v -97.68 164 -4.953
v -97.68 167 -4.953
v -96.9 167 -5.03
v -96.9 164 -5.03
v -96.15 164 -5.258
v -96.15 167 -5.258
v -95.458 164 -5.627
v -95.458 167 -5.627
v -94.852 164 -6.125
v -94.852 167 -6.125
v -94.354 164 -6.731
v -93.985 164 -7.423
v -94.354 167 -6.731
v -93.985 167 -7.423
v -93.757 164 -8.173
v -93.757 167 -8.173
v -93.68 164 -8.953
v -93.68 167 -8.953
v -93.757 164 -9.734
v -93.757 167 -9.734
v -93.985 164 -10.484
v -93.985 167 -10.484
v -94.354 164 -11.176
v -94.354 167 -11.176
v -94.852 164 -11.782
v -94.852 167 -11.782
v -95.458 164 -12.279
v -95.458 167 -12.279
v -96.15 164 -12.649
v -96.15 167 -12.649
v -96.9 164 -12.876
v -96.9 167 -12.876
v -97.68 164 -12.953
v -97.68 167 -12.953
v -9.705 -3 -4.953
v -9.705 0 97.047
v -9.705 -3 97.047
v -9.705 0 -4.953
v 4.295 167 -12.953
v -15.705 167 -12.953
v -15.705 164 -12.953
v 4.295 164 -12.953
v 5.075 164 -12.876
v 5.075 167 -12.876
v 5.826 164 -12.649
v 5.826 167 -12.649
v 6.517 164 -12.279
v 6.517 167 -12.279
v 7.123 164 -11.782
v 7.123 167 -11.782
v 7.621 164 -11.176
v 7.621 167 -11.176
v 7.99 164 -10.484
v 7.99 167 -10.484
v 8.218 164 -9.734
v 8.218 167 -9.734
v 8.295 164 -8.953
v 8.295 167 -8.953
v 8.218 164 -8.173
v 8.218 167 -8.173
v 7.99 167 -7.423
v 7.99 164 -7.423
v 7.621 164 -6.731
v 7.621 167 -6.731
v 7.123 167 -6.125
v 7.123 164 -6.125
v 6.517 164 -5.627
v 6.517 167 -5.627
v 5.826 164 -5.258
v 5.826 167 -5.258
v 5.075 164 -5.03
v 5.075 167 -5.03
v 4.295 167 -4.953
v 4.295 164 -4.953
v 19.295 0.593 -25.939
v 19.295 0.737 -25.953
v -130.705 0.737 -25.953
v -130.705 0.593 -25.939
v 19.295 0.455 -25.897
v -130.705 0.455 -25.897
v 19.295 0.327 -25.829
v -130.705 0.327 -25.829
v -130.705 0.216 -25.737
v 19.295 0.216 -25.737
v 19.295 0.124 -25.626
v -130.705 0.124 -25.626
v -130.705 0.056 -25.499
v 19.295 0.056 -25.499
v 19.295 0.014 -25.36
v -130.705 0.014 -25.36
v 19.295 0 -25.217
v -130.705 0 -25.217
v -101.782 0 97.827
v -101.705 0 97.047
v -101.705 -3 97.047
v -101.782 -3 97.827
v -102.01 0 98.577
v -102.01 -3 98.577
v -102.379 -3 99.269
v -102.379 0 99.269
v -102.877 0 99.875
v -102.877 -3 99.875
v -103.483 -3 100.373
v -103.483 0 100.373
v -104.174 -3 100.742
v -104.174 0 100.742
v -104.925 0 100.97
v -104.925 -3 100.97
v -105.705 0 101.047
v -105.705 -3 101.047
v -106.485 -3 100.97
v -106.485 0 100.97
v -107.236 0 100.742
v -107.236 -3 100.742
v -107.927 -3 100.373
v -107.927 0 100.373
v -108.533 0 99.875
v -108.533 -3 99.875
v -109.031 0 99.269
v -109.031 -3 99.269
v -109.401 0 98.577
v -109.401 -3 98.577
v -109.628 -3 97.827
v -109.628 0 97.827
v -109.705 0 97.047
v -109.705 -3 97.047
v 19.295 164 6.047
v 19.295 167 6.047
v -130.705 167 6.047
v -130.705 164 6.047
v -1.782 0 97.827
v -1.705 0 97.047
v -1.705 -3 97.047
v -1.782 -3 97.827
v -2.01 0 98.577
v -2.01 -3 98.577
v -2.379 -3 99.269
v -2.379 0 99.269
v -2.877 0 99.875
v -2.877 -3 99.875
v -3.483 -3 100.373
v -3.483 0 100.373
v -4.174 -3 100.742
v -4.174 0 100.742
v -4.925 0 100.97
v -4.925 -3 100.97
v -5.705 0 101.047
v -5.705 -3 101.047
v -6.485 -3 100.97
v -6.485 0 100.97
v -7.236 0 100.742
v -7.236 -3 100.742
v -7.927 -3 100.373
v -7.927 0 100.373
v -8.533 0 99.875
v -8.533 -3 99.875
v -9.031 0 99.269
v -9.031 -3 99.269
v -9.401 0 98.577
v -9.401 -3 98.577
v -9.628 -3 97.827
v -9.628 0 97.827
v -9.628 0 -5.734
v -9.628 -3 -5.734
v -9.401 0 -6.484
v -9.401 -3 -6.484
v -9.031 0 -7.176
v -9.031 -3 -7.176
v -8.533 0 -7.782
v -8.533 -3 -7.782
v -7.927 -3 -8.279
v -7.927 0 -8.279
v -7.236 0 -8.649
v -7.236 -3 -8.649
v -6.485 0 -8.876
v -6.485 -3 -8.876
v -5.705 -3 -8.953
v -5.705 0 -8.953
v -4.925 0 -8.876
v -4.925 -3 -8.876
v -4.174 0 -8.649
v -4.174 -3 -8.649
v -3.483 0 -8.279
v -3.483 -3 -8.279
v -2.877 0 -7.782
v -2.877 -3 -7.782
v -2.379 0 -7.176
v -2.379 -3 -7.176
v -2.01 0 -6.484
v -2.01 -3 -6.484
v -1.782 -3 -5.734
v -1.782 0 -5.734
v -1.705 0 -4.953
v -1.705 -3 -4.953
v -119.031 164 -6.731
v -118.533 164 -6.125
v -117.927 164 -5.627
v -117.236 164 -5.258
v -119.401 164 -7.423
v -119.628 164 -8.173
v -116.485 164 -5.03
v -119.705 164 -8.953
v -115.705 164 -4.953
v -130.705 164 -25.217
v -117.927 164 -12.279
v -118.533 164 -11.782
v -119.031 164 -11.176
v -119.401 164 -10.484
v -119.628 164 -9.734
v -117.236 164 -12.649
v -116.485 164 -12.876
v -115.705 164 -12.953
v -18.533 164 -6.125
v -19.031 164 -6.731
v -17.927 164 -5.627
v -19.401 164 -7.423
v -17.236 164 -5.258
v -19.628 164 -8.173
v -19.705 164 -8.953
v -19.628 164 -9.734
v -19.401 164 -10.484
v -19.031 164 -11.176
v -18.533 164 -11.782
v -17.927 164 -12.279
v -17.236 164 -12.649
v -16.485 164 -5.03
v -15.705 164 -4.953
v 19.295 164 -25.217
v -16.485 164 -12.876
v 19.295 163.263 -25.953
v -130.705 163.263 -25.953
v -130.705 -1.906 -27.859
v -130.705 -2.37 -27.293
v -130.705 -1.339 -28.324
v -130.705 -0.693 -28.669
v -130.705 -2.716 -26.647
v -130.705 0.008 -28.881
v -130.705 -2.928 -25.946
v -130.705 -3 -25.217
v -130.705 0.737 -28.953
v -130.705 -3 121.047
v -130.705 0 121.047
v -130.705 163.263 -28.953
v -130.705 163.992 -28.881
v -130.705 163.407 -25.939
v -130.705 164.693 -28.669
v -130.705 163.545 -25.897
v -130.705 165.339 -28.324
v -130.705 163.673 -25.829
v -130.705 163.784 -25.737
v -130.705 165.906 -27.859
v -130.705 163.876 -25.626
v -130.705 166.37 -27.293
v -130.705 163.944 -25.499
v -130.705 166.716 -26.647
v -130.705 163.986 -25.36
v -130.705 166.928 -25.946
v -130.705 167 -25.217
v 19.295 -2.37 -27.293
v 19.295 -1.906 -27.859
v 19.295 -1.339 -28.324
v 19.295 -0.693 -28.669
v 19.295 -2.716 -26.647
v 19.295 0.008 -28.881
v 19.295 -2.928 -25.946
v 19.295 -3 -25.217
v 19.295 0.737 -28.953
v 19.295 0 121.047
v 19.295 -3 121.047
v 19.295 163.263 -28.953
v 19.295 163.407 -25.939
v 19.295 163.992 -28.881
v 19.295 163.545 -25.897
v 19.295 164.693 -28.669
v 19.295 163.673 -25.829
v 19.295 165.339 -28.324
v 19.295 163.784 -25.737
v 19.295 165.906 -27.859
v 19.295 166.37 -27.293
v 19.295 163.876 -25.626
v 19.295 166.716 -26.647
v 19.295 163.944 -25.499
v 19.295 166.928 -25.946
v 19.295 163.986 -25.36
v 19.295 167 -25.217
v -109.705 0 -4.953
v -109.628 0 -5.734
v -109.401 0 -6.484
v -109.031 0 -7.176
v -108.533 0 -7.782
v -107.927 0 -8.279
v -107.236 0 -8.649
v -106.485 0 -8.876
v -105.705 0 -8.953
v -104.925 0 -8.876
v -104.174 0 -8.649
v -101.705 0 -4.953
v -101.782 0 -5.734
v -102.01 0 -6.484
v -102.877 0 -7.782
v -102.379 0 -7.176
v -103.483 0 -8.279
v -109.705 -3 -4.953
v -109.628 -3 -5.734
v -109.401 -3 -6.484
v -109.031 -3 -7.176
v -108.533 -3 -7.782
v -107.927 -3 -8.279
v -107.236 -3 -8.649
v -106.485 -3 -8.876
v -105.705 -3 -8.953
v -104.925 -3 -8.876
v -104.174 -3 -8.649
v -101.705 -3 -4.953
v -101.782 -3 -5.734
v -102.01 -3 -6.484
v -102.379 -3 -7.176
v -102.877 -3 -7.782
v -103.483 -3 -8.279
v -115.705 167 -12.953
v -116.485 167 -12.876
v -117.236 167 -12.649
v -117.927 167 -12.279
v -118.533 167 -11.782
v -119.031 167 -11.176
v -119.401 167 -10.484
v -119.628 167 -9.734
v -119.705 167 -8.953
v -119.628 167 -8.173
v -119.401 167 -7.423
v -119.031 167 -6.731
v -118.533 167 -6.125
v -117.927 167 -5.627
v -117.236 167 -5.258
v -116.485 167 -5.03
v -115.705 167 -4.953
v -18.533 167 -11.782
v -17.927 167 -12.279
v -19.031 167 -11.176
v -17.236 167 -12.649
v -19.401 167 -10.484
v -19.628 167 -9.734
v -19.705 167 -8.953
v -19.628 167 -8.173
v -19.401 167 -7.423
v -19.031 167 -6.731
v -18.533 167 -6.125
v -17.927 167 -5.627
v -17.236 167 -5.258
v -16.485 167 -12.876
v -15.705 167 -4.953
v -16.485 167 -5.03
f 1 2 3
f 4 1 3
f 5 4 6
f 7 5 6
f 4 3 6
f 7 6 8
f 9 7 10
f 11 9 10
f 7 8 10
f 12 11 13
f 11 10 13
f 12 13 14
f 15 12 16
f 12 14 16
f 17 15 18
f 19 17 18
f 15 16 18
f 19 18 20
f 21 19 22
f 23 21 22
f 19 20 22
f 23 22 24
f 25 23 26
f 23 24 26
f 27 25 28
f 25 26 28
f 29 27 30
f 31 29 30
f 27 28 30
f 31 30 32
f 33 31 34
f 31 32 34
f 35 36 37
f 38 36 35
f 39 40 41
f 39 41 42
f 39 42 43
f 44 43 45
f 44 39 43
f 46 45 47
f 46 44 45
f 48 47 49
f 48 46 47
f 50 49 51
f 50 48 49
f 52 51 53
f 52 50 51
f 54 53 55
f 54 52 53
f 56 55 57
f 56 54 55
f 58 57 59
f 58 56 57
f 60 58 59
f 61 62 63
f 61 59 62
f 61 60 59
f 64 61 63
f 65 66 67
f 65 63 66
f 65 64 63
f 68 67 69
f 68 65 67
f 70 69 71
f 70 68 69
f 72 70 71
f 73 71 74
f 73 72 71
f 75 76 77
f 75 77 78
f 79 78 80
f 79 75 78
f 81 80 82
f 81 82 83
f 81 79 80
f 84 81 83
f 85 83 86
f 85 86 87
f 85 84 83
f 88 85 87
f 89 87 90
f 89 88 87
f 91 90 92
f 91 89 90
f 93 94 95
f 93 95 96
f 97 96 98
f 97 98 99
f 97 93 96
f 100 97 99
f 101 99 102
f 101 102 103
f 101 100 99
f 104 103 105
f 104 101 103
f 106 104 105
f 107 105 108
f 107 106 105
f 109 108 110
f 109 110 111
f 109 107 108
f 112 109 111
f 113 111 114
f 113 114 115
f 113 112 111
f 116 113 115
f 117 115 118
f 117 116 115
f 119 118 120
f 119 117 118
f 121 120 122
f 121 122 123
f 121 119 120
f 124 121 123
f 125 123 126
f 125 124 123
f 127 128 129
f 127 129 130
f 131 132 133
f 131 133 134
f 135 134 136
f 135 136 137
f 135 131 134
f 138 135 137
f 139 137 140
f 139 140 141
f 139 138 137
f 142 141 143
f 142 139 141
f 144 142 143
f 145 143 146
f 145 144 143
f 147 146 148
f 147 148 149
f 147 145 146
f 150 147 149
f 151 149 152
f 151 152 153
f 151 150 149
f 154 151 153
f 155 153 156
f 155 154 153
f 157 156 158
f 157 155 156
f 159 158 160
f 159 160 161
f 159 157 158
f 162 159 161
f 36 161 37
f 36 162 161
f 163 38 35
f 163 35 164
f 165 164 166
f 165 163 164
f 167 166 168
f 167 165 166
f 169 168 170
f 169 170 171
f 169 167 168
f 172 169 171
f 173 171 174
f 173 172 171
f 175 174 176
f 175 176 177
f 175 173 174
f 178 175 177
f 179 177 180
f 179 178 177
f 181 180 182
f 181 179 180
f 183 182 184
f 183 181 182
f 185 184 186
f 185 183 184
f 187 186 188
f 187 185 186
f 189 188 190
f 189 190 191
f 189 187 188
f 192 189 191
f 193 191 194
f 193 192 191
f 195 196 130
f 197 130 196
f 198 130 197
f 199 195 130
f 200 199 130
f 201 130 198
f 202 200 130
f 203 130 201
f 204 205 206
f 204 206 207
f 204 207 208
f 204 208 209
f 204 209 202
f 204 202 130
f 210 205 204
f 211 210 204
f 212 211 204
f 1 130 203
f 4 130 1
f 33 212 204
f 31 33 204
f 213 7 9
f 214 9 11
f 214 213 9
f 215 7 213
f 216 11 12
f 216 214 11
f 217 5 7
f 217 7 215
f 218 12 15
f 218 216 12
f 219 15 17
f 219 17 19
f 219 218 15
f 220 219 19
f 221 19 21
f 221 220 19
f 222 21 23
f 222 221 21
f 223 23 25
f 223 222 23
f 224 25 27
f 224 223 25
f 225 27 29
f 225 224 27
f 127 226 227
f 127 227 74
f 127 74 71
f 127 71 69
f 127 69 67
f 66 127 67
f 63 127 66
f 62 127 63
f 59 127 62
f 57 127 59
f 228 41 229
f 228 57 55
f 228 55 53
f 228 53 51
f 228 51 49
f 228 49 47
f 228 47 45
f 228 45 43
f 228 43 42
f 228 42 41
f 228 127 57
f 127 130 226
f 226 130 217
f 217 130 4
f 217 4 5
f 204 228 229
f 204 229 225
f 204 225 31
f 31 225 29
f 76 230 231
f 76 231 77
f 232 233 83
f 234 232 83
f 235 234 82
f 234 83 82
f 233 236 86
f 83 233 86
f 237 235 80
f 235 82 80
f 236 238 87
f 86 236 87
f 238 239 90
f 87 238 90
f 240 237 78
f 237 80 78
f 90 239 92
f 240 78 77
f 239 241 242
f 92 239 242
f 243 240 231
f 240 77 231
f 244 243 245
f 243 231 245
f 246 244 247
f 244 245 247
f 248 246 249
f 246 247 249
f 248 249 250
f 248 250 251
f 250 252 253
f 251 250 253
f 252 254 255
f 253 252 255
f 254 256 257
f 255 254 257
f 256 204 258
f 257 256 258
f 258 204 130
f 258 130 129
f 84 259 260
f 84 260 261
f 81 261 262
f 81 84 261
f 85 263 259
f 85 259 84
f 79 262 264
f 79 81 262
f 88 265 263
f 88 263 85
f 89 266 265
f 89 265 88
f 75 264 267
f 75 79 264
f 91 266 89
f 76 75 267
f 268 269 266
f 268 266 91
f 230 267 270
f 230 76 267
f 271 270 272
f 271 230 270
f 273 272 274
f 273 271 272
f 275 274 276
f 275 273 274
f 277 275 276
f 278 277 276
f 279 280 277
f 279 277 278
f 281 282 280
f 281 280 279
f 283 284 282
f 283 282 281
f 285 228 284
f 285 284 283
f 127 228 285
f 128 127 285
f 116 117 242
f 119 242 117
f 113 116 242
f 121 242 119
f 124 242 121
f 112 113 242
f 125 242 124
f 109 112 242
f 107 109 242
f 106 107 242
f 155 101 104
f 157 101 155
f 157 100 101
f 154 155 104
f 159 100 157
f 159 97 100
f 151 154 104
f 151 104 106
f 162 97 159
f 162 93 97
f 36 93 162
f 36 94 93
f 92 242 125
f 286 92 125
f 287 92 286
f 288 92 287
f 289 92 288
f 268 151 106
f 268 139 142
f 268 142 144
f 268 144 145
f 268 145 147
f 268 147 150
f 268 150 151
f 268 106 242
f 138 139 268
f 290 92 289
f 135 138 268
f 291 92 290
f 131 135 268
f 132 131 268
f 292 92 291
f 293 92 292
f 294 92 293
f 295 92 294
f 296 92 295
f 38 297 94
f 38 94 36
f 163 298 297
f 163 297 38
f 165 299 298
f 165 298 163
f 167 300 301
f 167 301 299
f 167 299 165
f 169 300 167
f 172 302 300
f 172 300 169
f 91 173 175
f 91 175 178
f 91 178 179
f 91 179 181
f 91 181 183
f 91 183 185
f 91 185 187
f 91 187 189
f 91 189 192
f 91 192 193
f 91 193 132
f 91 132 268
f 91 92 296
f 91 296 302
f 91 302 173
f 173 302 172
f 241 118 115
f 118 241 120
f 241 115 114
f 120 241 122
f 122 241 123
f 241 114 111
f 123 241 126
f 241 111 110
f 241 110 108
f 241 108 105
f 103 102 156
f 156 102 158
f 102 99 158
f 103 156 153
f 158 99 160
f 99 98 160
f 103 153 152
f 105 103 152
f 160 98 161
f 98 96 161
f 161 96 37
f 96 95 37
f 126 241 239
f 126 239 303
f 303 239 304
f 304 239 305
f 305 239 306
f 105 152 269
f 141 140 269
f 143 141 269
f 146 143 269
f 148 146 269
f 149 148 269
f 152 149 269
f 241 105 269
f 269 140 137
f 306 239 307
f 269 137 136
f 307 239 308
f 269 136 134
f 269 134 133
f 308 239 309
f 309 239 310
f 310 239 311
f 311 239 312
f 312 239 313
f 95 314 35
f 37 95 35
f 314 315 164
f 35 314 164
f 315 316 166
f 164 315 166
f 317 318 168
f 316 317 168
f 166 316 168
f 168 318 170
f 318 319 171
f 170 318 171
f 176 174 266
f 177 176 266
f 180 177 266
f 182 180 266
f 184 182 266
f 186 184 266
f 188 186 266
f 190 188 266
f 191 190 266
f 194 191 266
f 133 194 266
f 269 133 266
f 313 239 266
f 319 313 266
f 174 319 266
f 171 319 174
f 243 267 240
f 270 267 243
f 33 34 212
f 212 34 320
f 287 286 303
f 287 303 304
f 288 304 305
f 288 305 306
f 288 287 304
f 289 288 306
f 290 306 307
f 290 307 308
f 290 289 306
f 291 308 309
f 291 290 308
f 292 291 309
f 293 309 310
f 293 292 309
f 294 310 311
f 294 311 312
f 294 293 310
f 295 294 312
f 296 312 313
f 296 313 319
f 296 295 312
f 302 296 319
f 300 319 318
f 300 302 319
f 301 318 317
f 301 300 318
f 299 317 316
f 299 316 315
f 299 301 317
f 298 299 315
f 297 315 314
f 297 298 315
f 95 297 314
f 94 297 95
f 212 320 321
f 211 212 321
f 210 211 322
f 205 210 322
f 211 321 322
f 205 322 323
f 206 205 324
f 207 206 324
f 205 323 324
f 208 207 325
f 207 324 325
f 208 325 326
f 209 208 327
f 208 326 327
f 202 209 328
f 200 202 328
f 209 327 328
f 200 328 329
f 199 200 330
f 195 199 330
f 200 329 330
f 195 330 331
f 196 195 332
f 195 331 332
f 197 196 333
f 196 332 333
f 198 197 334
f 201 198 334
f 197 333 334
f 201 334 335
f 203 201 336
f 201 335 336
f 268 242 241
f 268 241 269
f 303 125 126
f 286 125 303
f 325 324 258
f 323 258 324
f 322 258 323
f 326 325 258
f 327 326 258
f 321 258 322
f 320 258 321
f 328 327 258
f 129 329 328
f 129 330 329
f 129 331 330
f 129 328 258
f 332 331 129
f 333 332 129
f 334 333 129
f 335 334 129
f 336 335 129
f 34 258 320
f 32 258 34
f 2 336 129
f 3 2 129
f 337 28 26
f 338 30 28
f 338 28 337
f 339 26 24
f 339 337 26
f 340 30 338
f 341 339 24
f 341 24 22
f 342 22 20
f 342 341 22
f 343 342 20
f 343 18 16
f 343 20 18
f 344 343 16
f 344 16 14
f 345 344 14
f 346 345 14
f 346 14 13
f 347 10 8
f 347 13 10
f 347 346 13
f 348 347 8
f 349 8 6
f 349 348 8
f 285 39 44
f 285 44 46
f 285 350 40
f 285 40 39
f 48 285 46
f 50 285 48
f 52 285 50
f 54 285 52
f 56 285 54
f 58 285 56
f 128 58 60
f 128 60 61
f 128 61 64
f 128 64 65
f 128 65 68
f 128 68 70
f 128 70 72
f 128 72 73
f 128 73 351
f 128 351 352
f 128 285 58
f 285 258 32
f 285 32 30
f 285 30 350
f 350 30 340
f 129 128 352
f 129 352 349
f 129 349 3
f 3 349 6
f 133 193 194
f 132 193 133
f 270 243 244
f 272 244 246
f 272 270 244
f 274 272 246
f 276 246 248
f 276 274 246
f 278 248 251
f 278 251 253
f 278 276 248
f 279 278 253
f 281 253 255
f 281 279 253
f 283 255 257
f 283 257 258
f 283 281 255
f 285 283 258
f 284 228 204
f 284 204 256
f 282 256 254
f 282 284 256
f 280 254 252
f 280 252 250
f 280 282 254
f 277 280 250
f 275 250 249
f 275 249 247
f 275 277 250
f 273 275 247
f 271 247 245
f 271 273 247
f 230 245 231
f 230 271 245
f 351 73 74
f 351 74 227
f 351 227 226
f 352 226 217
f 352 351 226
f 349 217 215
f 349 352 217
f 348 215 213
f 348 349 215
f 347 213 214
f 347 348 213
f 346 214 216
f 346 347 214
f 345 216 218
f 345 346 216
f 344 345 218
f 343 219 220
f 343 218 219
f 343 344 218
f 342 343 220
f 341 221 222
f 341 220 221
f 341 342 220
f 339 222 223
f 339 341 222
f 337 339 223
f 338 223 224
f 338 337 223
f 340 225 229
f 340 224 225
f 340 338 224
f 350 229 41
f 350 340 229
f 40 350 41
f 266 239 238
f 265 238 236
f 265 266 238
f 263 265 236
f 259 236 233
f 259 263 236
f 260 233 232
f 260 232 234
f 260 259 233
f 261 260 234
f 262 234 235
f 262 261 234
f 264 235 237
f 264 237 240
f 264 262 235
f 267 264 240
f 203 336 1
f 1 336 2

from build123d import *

# Parameters (mm, degrees)
SKETCH1_W                    = 150
SKETCH1_H                    = 150
BASE_FLANGE1_DEPTH           = 3
EDGE_FLANGE1_STRIP_W         = 13.4732
EDGE_FLANGE1_STRIP_H         = 3
EDGE_FLANGE1_STRIP_CUT_DEPTH = 150
EDGE_FLANGE1_DEPTH           = 150
EDGE_FLANGE2_STRIP_W         = 13.4732
EDGE_FLANGE2_STRIP_H         = 3
EDGE_FLANGE2_STRIP_CUT_DEPTH = 150
EDGE_FLANGE2_DEPTH           = 150
CUT_EXTRUDE1_DEPTH           = 10


# Sheet-metal steps are written as plain solids
with BuildPart() as part:
    # Sketch1 → Base-Flange1 (new body)
    with BuildSketch(Plane(origin=(0, 0, 0), x_dir=(1, 0, 0), z_dir=(0, 1, 0))):
        with Locations((-55.705035971, -46.04676259)):
            Rectangle(SKETCH1_W, SKETCH1_H)
        with BuildLine():
            Line((-101.705035971, 4.95323741), (-101.705035971, -97.04676259))
            ThreePointArc((-101.705035971, -97.04676259), (-105.705035971, -101.04676259), (-109.705035971, -97.04676259))
            Line((-109.705035971, -97.04676259), (-109.705035971, 4.95323741))
            ThreePointArc((-109.705035971, 4.95323741), (-105.705035971, 8.95323741), (-101.705035971, 4.95323741))
        make_face(mode=Mode.SUBTRACT)
        with BuildLine():
            Line((-1.705035971, 4.95323741), (-1.705035971, -97.04676259))
            ThreePointArc((-1.705035971, -97.04676259), (-5.705035971, -101.04676259), (-9.705035971, -97.04676259))
            Line((-9.705035971, -97.04676259), (-9.705035971, 4.95323741))
            ThreePointArc((-9.705035971, 4.95323741), (-5.705035971, 8.95323741), (-1.705035971, 4.95323741))
        make_face(mode=Mode.SUBTRACT)
    extrude(amount=-BASE_FLANGE1_DEPTH)

    # Edge-Flange1 strip (across the edge) → Edge-Flange1 strip cut (cut)
    with BuildSketch(Plane(origin=(19.294964029, 0, -28.95323741), x_dir=(0, 0, 1), z_dir=(-1, 0, 0))):
        with Locations((-3, -1.5)):
            Rectangle(EDGE_FLANGE1_STRIP_W, EDGE_FLANGE1_STRIP_H)
    extrude(amount=EDGE_FLANGE1_STRIP_CUT_DEPTH, mode=Mode.SUBTRACT)

    # Edge-Flange1 section (across the edge) → Edge-Flange1 (add)
    with BuildSketch(Plane(origin=(19.294964029, 0, -28.95323741), x_dir=(0, 0, 1), z_dir=(-1, 0, 0))):
        with BuildLine():
            Line((0, 0.7366), (0, 167))
            Line((0, 167), (3, 167))
            Line((3, 167), (3, 0.7366))
            ThreePointArc((3, 0.7366), (3.215745145, 0.215745145), (3.7366, 0))
            Line((3.7366, 0), (3.7366, -3))
            ThreePointArc((3.7366, -3), (1.094424801, -1.905575199), (0, 0.7366))
        make_face()
    extrude(amount=EDGE_FLANGE1_DEPTH)

    # Edge-Flange2 strip (across the edge) → Edge-Flange2 strip cut (cut)
    with BuildSketch(Plane(origin=(19.294964029, 167, -25.95323741), x_dir=(0, -1, 0), z_dir=(-1, 0, 0))):
        with Locations((-3, -1.5)):
            Rectangle(EDGE_FLANGE2_STRIP_W, EDGE_FLANGE2_STRIP_H)
    extrude(amount=EDGE_FLANGE2_STRIP_CUT_DEPTH, mode=Mode.SUBTRACT)

    # Edge-Flange2 section (across the edge) → Edge-Flange2 (add)
    with BuildSketch(Plane(origin=(19.294964029, 167, -25.95323741), x_dir=(0, -1, 0), z_dir=(-1, 0, 0))):
        with BuildLine():
            Line((0, 0.7366), (0, 32))
            Line((0, 32), (3, 32))
            Line((3, 32), (3, 0.7366))
            ThreePointArc((3, 0.7366), (3.215745145, 0.215745145), (3.7366, 0))
            Line((3.7366, 0), (3.7366, -3))
            ThreePointArc((3.7366, -3), (1.094424801, -1.905575199), (0, 0.7366))
        make_face()
    extrude(amount=EDGE_FLANGE2_DEPTH)

    # Sketch12 → Cut-Extrude1 (cut)
    with BuildSketch(Plane(origin=(0, 167, 0), x_dir=(1, 0, 0), z_dir=(0, 1, 0))):
        with BuildLine():
            Line((4.294964029, 4.95323741), (-15.705035971, 4.95323741))
            ThreePointArc((-15.705035971, 4.95323741), (-19.705035971, 8.95323741), (-15.705035971, 12.95323741))
            Line((-15.705035971, 12.95323741), (4.294964029, 12.95323741))
            ThreePointArc((4.294964029, 12.95323741), (8.294964029, 8.95323741), (4.294964029, 4.95323741))
        make_face()
        with BuildLine():
            Line((-115.705035971, 4.95323741), (-97.680274897, 4.95323741))
            ThreePointArc((-97.680274897, 4.95323741), (-93.680274897, 8.95323741), (-97.680274897, 12.95323741))
            Line((-97.680274897, 12.95323741), (-115.705035971, 12.95323741))
            ThreePointArc((-115.705035971, 12.95323741), (-119.705035971, 8.95323741), (-115.705035971, 4.95323741))
        make_face()
    extrude(amount=-CUT_EXTRUDE1_DEPTH, mode=Mode.SUBTRACT)


solid = part.part
